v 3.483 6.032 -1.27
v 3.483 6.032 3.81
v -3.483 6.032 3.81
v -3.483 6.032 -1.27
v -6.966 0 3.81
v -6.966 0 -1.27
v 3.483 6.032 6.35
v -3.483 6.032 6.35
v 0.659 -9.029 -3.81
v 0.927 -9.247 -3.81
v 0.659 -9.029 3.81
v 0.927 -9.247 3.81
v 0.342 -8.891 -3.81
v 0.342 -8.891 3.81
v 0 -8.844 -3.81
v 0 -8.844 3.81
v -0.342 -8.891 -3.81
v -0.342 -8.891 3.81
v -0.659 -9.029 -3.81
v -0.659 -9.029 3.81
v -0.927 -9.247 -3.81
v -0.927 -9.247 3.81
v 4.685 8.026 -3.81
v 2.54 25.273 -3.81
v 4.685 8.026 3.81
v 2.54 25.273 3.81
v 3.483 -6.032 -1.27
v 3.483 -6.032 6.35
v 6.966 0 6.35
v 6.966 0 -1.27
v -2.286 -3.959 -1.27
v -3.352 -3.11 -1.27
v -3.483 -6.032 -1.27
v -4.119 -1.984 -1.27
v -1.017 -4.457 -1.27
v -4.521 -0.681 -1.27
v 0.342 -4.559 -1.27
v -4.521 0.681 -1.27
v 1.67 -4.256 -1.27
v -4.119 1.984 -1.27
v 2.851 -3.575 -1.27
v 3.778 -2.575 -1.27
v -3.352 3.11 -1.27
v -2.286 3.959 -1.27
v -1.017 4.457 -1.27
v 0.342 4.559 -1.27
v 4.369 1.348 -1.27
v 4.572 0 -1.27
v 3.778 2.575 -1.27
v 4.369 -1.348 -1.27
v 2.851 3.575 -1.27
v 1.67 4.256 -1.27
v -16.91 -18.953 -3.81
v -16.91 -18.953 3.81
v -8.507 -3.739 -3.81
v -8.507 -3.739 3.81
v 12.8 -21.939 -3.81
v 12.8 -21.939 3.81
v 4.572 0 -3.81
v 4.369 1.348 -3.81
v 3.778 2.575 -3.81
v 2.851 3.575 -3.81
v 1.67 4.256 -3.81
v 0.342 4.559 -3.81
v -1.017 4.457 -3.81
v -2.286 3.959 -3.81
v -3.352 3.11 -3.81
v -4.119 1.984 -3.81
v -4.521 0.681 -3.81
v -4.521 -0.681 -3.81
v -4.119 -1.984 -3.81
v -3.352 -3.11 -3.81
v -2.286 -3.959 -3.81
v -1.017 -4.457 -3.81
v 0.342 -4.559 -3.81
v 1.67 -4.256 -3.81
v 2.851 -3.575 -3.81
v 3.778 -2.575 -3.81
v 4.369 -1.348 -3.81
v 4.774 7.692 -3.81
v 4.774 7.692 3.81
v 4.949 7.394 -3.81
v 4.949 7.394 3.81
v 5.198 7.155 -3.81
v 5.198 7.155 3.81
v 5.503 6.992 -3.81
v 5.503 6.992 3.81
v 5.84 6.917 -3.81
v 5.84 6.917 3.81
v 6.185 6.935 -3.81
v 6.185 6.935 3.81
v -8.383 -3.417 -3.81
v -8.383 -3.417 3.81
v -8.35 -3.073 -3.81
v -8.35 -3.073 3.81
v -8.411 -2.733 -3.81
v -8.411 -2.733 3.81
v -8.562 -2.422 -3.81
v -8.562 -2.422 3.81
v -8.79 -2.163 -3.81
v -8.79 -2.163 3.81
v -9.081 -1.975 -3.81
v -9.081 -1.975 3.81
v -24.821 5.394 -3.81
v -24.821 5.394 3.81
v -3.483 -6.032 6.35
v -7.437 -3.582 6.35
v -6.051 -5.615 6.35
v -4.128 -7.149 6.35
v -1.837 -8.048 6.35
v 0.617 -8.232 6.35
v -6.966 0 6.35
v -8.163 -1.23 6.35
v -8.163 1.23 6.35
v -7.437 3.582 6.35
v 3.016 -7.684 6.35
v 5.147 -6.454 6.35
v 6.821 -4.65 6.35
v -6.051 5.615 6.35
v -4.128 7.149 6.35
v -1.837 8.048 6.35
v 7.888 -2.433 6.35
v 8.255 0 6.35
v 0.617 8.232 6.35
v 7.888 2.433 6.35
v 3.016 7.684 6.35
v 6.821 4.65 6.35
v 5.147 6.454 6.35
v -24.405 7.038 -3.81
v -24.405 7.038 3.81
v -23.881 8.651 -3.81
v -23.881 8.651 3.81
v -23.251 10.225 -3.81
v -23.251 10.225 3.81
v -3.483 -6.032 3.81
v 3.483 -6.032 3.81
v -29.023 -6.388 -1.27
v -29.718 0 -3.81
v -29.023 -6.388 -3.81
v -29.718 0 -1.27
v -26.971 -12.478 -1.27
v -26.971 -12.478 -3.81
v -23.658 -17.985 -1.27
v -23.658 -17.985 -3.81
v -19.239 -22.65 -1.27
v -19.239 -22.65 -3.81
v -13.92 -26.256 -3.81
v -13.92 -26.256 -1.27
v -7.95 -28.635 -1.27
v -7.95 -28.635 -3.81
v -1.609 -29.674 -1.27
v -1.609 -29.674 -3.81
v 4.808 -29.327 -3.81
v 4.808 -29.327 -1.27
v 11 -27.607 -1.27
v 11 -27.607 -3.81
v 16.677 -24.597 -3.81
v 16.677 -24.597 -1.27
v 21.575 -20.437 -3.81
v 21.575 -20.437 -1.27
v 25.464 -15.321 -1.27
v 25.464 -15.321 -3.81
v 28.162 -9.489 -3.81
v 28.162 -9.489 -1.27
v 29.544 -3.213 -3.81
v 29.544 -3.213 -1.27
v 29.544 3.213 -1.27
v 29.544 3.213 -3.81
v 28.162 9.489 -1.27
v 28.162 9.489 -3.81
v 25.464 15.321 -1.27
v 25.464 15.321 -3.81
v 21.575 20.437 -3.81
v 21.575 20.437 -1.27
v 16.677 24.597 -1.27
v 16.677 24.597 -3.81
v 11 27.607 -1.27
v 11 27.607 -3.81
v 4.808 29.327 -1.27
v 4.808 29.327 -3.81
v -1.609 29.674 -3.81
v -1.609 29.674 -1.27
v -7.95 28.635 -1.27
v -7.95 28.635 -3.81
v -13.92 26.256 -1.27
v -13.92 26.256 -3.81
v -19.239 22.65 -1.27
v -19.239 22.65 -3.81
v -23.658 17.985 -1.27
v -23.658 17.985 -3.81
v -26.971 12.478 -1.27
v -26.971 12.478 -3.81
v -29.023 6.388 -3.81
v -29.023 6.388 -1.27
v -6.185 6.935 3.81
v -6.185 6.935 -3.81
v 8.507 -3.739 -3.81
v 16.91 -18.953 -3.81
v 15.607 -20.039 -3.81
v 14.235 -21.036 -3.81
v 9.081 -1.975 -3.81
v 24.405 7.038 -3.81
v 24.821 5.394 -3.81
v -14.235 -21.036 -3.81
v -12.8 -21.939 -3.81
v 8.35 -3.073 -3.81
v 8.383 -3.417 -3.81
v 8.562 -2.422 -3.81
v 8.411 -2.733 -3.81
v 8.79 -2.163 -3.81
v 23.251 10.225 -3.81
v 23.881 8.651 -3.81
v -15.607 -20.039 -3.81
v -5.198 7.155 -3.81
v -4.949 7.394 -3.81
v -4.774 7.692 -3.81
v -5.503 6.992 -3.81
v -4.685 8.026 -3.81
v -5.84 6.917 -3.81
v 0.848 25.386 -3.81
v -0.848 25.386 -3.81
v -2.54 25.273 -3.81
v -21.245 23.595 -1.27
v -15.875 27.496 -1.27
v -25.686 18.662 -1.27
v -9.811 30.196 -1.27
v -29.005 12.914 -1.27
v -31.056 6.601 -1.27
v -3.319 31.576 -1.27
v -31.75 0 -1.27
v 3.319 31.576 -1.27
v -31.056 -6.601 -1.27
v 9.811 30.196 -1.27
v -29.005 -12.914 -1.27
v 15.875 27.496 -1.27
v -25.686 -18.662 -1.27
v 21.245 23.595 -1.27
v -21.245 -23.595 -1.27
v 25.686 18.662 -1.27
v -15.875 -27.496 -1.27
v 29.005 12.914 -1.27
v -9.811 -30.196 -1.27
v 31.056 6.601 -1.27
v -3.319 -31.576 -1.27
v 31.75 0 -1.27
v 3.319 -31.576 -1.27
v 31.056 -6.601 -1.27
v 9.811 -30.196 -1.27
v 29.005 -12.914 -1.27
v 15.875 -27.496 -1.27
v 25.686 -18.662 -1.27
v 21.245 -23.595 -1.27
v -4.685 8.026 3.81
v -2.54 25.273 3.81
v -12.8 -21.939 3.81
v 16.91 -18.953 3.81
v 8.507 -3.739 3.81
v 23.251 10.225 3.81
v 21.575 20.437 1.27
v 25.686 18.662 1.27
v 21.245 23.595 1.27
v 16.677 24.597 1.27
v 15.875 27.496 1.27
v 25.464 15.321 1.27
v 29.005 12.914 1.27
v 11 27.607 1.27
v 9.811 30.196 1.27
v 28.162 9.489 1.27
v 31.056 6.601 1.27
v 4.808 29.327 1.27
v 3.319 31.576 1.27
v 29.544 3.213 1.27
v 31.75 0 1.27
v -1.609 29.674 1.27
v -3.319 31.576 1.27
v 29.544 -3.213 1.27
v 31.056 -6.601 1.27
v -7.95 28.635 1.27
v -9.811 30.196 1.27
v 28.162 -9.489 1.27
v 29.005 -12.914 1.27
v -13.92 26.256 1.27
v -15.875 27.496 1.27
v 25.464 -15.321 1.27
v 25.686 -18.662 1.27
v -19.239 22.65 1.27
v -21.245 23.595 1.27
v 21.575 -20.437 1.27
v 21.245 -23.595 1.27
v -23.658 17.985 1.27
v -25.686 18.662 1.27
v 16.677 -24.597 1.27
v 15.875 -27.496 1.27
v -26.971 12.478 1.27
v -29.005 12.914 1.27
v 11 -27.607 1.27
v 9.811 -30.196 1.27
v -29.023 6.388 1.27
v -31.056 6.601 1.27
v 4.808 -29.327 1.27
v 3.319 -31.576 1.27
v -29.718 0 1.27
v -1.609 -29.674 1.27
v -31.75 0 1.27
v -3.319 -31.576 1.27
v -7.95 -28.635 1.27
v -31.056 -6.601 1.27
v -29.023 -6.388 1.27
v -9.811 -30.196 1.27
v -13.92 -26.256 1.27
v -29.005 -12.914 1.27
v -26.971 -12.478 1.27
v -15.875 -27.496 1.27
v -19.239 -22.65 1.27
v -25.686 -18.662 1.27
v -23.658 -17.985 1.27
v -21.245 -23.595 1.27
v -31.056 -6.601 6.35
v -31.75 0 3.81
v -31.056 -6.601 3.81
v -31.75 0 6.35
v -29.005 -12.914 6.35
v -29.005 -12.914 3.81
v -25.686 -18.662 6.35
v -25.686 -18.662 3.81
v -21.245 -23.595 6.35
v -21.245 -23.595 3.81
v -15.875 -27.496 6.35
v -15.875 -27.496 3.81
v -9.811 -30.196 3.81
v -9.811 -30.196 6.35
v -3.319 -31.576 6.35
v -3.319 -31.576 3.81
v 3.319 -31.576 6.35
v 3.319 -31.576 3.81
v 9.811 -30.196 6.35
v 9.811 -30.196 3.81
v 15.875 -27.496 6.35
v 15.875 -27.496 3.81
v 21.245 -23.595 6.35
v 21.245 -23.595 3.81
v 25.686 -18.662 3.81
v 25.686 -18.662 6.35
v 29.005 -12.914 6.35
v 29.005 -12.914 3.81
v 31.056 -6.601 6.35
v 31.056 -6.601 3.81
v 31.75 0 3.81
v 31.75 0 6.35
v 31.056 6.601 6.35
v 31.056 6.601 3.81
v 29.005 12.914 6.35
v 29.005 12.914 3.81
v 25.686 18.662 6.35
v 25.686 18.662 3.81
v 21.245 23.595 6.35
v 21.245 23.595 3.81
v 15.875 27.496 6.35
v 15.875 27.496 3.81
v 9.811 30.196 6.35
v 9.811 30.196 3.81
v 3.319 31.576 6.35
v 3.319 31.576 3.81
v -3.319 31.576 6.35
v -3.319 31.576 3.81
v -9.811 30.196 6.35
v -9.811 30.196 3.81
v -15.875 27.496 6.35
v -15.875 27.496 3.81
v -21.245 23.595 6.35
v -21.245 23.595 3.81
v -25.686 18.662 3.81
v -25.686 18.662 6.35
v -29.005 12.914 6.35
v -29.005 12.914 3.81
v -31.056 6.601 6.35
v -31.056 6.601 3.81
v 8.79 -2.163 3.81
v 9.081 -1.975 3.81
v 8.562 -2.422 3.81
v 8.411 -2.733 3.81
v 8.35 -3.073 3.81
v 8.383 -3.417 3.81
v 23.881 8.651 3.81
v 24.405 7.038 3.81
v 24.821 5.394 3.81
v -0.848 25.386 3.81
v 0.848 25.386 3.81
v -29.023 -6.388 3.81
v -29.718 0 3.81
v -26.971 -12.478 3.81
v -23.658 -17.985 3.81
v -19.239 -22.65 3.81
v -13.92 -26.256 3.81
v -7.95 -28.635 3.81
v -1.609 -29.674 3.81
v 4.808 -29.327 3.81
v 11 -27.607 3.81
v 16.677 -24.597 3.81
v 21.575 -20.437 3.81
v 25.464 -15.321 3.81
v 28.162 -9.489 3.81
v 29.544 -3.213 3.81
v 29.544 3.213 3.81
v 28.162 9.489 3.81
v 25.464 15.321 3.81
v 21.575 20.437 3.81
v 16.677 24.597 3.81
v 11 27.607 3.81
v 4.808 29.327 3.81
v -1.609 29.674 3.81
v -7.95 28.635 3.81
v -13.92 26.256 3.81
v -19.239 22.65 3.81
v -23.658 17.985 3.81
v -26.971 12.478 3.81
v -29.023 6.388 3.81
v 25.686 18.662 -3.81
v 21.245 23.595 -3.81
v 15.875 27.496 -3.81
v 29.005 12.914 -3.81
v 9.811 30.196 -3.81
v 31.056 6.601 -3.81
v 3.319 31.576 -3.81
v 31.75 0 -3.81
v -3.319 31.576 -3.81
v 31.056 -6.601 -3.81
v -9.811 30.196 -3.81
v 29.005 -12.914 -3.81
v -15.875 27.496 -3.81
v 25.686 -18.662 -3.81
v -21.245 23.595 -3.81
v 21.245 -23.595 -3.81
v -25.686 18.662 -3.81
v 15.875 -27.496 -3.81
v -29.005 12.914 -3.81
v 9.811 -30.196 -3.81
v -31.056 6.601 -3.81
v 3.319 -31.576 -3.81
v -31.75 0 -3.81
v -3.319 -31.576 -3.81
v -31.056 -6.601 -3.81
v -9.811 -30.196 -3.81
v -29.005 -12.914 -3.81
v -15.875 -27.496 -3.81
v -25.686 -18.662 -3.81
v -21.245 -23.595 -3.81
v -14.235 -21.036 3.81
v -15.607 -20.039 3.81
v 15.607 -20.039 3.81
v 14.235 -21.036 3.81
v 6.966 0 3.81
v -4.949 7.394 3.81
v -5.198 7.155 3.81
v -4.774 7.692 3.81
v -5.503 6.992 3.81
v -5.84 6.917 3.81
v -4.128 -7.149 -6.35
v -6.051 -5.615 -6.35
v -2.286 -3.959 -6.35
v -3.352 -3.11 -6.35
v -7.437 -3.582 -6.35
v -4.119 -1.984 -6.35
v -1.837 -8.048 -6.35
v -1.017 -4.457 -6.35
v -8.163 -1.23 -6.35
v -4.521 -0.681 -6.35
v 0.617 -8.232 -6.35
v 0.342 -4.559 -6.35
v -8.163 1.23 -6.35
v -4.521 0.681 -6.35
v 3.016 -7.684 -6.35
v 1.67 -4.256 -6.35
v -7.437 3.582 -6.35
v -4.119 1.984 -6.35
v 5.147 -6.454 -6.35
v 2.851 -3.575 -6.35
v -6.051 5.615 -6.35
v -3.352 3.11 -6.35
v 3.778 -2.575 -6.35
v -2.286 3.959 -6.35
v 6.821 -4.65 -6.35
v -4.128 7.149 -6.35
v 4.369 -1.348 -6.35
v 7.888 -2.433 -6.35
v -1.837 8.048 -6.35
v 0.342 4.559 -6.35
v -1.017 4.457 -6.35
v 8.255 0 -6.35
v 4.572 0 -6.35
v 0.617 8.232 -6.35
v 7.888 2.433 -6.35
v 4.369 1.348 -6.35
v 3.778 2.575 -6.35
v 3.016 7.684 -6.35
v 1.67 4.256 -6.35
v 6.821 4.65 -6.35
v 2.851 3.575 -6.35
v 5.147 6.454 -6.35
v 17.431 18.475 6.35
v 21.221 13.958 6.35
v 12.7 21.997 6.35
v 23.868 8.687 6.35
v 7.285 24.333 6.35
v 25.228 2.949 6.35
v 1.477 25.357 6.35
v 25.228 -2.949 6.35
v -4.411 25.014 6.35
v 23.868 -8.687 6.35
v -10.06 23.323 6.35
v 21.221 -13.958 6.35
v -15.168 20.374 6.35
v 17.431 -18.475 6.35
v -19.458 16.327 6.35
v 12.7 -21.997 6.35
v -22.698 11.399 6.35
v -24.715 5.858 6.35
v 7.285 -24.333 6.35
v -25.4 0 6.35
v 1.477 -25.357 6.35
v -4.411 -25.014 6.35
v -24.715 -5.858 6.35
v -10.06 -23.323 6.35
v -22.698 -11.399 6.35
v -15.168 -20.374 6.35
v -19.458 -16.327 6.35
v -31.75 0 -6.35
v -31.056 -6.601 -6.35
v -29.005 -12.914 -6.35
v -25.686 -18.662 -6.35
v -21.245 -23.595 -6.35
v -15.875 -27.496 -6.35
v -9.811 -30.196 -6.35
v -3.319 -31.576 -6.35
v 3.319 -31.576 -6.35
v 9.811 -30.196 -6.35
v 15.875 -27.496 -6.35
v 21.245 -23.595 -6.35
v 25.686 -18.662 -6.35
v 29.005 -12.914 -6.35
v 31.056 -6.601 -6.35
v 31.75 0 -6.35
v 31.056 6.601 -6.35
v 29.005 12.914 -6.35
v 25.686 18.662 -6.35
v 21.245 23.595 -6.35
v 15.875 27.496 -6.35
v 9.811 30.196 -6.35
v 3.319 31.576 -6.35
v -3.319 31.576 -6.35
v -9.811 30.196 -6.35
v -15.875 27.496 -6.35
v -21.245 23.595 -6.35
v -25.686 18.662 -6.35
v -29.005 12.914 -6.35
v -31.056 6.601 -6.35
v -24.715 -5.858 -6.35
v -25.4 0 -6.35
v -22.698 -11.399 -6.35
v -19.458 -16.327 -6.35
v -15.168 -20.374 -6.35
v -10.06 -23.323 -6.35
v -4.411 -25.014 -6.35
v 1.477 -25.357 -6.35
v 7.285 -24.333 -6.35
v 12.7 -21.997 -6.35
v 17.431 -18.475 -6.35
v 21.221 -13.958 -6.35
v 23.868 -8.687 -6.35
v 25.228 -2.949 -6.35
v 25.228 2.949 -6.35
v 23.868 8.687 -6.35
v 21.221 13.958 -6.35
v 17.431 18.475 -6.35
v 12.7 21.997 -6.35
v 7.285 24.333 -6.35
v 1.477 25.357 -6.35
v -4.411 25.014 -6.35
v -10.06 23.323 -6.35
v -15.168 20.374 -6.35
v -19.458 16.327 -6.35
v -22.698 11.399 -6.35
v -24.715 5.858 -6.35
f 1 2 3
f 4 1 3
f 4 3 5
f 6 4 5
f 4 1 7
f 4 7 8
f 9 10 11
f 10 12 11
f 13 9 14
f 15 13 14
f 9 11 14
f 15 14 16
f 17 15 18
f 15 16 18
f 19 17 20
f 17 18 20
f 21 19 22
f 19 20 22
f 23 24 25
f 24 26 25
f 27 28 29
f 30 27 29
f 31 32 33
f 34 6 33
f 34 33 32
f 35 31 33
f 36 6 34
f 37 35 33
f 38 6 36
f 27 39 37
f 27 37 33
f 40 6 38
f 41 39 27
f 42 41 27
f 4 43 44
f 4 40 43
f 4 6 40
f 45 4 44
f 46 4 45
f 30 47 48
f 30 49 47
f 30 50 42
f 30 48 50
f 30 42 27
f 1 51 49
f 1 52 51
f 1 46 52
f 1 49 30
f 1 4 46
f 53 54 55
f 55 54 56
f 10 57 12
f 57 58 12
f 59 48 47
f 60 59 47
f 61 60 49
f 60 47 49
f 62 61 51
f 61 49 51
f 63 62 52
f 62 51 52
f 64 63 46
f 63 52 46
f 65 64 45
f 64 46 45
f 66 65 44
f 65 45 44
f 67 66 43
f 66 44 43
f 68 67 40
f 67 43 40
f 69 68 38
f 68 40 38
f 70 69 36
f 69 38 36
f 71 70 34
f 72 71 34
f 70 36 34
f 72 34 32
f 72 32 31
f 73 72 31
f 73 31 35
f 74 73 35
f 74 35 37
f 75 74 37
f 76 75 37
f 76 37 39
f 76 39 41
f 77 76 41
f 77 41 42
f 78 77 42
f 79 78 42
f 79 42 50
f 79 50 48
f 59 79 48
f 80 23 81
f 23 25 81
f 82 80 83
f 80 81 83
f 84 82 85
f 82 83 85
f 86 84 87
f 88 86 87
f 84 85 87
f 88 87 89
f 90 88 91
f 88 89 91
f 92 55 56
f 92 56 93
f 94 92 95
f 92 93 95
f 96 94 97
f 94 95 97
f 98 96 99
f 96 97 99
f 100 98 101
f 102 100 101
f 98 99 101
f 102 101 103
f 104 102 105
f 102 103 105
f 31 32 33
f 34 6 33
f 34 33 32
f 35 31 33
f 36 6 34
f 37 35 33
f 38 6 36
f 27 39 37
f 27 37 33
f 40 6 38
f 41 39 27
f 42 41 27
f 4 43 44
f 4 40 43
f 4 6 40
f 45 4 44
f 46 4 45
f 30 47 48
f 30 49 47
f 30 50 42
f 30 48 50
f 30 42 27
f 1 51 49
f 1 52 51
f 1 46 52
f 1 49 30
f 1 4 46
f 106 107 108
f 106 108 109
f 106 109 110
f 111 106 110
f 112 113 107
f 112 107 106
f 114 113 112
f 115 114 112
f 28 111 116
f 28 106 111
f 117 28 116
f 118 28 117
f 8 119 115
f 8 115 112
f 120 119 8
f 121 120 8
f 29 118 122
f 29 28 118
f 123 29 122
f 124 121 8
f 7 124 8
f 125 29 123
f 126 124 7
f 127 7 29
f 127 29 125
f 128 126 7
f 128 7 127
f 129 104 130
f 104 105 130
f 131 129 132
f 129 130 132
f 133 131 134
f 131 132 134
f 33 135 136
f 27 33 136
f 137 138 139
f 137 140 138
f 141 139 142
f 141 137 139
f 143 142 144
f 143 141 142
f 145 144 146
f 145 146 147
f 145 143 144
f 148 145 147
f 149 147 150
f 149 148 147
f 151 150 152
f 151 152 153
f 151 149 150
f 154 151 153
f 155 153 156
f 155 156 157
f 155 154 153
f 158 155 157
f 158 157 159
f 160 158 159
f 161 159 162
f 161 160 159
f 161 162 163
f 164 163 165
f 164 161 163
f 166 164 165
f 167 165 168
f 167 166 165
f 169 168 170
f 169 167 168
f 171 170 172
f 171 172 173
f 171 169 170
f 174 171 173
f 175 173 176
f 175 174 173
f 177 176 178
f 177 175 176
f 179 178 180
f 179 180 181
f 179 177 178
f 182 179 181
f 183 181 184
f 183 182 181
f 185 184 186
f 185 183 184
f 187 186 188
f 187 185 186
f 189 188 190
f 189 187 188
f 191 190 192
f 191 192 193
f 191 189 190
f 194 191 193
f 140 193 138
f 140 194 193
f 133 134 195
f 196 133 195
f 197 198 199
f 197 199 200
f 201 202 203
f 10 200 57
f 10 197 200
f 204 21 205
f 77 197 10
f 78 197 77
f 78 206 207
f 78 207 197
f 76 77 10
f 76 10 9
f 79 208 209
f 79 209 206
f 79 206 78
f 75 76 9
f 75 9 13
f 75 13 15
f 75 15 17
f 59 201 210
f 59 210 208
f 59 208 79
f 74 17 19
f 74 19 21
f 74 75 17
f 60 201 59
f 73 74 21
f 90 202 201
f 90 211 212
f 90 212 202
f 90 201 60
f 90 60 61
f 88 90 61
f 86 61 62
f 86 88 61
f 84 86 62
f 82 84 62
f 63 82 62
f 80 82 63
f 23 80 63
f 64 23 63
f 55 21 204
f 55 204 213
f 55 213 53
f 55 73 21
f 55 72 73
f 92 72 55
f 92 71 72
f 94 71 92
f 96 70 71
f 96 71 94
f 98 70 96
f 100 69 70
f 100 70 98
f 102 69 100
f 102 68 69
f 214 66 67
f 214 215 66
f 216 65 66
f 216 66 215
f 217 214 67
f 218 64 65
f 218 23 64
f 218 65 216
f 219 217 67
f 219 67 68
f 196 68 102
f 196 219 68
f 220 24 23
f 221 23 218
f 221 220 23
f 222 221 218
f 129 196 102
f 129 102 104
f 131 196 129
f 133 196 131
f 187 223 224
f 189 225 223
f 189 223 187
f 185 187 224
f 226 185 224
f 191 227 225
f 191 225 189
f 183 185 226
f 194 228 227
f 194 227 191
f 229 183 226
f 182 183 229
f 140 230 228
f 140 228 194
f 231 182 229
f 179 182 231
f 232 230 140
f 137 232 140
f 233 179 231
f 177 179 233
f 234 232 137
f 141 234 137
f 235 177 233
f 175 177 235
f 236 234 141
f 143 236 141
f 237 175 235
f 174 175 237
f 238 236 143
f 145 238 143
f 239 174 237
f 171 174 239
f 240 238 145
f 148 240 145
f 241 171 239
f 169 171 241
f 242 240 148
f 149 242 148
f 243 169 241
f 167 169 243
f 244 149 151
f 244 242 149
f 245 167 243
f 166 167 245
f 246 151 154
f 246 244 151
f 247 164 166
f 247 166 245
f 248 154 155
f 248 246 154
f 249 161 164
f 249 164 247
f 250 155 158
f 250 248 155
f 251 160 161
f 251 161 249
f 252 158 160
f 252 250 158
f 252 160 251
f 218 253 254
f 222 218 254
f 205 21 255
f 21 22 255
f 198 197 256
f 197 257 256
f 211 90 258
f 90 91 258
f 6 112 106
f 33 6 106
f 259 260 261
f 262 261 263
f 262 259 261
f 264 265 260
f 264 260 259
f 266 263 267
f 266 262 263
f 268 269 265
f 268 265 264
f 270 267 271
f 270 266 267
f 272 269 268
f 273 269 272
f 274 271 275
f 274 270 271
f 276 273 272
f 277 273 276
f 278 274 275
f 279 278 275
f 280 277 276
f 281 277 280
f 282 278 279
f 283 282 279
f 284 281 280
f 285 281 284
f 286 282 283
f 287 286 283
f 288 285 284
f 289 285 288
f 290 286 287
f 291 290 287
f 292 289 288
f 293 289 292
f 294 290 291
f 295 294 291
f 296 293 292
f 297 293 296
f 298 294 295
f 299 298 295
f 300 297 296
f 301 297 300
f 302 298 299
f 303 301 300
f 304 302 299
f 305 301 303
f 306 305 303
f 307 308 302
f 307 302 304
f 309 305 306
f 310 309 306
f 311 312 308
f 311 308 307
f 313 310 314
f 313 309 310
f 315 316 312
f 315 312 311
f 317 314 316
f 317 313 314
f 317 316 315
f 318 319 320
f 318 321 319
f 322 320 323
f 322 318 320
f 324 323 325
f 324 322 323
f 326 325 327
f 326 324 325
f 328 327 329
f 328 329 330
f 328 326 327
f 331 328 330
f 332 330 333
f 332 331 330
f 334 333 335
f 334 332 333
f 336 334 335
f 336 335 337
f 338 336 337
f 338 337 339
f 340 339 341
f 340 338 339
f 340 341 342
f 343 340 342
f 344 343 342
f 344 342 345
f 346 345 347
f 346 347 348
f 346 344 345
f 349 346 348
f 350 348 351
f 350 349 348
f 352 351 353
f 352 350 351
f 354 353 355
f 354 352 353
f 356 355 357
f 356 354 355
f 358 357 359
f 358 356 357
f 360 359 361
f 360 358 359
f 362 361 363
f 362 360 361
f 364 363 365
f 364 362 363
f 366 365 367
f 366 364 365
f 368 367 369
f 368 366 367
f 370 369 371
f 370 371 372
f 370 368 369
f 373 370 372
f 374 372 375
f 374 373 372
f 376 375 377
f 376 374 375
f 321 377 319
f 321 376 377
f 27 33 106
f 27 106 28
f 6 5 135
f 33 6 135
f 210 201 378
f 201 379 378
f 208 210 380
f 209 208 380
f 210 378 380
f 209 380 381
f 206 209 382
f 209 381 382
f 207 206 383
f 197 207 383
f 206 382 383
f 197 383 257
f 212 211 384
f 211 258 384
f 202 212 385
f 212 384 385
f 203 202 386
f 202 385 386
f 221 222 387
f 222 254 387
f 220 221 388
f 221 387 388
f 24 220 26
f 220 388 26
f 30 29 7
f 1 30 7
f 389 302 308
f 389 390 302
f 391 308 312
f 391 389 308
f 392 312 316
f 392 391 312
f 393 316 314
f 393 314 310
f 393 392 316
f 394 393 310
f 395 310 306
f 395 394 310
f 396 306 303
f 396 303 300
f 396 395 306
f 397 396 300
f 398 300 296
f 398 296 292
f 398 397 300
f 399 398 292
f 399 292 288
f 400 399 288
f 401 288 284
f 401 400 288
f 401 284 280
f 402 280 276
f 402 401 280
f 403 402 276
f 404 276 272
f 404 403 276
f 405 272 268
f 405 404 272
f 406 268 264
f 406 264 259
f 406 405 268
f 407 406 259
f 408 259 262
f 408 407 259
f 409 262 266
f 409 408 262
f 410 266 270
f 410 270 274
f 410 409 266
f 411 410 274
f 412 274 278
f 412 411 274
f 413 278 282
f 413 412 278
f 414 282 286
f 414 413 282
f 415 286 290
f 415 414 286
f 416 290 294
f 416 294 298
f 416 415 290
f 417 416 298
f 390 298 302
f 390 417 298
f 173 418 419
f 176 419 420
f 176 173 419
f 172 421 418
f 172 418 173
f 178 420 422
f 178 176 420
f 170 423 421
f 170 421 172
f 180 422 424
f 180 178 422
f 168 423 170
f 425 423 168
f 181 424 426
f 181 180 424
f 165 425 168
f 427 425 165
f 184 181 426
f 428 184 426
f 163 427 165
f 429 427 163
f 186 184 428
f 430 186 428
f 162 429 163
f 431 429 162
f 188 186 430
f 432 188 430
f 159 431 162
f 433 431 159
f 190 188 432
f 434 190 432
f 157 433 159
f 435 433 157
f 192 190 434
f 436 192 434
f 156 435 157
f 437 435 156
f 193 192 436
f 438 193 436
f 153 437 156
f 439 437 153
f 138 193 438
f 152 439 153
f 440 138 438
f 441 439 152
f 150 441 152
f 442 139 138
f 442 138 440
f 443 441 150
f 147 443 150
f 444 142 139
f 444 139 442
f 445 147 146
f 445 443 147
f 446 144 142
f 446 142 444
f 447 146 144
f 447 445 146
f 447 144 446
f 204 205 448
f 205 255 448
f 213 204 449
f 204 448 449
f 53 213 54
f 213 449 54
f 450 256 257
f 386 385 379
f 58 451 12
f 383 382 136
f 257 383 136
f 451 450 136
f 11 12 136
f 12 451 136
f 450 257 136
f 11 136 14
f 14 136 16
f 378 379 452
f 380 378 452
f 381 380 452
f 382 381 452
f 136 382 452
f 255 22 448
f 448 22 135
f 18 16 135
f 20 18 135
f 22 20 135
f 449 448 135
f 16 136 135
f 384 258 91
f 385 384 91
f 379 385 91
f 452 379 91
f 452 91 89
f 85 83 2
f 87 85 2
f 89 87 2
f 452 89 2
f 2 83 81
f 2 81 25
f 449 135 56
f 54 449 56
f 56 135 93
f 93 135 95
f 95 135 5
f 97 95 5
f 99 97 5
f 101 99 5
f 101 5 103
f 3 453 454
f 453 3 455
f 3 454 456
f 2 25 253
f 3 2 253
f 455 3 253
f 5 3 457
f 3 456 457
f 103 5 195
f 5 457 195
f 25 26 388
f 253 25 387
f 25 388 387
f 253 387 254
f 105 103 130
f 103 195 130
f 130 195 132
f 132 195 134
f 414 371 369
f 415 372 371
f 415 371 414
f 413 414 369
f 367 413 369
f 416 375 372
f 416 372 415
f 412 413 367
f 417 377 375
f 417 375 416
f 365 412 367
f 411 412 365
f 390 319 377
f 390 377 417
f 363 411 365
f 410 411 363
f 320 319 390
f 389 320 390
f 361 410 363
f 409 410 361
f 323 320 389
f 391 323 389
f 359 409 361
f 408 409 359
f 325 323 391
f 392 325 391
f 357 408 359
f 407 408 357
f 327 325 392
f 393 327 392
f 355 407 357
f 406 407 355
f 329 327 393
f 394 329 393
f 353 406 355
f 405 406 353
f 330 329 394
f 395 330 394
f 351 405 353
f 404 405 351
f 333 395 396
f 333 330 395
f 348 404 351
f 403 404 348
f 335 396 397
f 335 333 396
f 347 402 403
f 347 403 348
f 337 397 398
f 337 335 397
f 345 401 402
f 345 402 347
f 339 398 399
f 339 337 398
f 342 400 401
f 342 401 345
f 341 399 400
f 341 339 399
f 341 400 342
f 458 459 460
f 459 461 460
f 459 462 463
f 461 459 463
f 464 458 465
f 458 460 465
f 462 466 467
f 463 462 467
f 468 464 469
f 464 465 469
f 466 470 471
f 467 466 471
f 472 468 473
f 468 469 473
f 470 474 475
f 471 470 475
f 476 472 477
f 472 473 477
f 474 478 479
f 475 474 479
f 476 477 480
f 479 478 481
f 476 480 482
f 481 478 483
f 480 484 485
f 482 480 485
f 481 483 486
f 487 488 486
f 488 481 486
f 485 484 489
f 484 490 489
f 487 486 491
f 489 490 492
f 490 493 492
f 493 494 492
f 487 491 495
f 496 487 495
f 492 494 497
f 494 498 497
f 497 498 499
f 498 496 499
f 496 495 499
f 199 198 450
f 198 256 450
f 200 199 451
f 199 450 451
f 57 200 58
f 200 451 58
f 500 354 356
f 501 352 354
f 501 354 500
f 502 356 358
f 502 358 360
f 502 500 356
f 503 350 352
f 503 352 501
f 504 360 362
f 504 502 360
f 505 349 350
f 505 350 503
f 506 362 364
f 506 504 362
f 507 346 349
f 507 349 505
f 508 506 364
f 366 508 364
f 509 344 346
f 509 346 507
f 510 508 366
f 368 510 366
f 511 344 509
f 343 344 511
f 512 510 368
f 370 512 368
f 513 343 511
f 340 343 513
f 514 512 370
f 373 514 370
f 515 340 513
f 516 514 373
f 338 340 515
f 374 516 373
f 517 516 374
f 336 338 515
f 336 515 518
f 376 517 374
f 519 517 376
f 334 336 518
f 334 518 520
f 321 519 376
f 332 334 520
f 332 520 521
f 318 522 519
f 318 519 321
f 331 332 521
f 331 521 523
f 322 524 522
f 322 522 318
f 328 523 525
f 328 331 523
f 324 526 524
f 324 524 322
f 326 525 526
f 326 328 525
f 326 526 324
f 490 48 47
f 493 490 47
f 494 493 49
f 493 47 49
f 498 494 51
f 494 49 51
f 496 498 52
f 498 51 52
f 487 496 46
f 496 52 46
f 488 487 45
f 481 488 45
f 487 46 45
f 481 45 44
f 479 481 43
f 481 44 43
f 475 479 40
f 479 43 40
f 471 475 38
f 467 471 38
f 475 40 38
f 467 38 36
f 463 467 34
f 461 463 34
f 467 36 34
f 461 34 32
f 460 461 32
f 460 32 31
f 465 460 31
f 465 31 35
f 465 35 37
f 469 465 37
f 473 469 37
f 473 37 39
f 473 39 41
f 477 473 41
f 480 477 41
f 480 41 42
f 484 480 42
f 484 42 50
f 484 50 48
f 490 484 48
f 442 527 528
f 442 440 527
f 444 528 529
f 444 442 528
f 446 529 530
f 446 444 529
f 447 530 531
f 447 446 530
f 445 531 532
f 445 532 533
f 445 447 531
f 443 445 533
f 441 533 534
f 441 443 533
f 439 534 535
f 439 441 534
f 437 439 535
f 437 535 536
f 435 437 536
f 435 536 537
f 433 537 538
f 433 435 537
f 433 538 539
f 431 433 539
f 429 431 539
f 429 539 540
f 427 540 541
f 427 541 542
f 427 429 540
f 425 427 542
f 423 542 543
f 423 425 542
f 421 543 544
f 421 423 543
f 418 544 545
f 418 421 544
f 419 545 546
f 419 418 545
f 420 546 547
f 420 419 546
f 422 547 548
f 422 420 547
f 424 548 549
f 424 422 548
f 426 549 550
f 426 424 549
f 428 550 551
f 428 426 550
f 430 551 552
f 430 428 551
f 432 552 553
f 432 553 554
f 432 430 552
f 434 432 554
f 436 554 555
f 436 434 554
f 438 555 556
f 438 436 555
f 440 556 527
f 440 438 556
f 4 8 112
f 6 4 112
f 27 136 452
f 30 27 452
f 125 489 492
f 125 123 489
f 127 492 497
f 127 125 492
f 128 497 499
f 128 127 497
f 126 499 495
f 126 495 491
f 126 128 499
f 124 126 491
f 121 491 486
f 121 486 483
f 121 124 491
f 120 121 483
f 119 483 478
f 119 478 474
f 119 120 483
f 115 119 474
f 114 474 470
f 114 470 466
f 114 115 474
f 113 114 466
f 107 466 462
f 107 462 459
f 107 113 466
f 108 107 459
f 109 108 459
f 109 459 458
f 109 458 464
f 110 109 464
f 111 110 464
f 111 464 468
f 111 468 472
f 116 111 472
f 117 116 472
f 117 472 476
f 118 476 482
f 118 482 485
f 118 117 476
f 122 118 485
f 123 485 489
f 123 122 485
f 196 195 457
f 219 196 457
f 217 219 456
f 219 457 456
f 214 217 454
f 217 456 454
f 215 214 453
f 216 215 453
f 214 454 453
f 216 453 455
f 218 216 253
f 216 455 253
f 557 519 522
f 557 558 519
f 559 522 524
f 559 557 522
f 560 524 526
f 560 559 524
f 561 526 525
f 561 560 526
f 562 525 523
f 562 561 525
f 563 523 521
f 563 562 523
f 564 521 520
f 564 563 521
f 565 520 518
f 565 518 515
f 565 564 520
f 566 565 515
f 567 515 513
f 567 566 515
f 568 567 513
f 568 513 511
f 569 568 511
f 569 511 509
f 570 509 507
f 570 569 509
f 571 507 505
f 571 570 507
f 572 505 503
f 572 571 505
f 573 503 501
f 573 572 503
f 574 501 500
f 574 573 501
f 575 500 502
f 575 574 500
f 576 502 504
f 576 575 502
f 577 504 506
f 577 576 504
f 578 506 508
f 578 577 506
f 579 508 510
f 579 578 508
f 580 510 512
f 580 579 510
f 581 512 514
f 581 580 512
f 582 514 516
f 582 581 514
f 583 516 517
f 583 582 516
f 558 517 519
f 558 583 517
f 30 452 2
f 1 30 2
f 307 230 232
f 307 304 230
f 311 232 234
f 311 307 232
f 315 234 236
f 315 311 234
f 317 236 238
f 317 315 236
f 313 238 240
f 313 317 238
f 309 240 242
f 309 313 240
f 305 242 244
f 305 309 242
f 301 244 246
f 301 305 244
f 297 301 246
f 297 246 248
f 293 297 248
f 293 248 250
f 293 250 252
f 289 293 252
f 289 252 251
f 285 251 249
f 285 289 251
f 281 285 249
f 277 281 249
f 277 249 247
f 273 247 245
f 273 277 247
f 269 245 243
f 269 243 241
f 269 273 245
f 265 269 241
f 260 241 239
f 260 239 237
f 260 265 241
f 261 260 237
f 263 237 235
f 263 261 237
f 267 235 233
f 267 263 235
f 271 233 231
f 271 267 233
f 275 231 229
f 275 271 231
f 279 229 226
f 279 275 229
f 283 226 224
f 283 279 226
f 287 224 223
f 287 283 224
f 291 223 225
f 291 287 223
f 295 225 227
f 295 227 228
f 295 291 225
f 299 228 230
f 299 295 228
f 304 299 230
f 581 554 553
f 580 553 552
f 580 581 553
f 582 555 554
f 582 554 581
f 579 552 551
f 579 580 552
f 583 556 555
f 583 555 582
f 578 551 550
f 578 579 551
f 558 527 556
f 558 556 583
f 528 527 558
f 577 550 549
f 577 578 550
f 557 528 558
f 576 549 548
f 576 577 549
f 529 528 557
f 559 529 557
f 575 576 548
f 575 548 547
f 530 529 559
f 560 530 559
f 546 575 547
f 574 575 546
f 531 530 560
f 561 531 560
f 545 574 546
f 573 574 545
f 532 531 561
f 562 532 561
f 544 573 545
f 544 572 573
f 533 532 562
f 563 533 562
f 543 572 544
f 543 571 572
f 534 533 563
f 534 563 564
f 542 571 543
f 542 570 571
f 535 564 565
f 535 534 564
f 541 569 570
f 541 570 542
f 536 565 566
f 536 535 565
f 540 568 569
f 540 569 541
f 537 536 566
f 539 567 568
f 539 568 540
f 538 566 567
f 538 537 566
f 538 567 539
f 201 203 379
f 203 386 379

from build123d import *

# Parameters (mm, degrees)
SKETCH2_R           = 8.255
BOSS_EXTRUDE1_DEPTH = 6.35
BOSS_EXTRUDE3_DEPTH = 3.81
CUT_EXTRUDE1_DEPTH  = 7.62
SKETCH5_R           = 4.572
CUT_EXTRUDE2_DEPTH  = 6.08


with BuildPart() as part:
    # Sketch1 → Revolve1 (revolve)
    with BuildSketch(Plane(origin=(0, 0, 0), x_dir=(1, 0, 0), z_dir=(0, 1, 0))):
        Polygon((-25.4, 6.35), (-31.75, 6.35), (-31.75, 3.81), (-29.718, 3.81), (-29.718, 1.27), (-31.75, 1.27), (-31.75, -1.27), (-29.718, -1.27), (-29.718, -3.81), (-31.75, -3.81), (-31.75, -6.35), (-25.4, -6.35), align=None)
    revolve(axis=Axis((0, 0, -7.15010339), (0, 0, 1)))


with BuildPart() as body_2:
    # Sketch2 → Boss-Extrude1 (new body, symmetric)
    with BuildSketch(Plane.XY):
        Circle(SKETCH2_R)
    extrude(amount=BOSS_EXTRUDE1_DEPTH, both=True)


with BuildPart() as body_3:
    # Sketch3 → Boss-Extrude3 (new body, symmetric)
    with BuildSketch(Plane.XY):
        with BuildLine():
            Line((-4.684628445, 8.025767673), (-2.54, 25.272680903))
            ThreePointArc((-2.54, 25.272680903), (0, 25.4), (2.54, 25.272680903))
            Line((2.54, 25.272680903), (4.684628445, 8.025767673))
            ThreePointArc((4.684628445, 8.025767673), (5.198434869, 7.155031769), (6.185328842, 6.935445013))
            Line((6.185328842, 6.935445013), (23.250844691, 10.225371444))
            ThreePointArc((23.250844691, 10.225371444), (24.156835514, 7.849031657), (24.820651022, 5.394004341))
            Line((24.820651022, 5.394004341), (9.080588446, -1.975247805))
            ThreePointArc((9.080588446, -1.975247805), (8.411244307, -2.732978945), (8.507371901, -3.739426928))
            Line((8.507371901, -3.739426928), (16.909812286, -18.953053803))
            ThreePointArc((16.909812286, -18.953053803), (14.929745408, -20.549031657), (12.800005955, -21.939002884))
            Line((12.800005955, -21.939002884), (0.927483852, -9.246537953))
            ThreePointArc((0.927483852, -9.246537953), (0, -8.844105648), (-0.927483852, -9.246537953))
            Line((-0.927483852, -9.246537953), (-12.800005955, -21.939002884))
            ThreePointArc((-12.800005955, -21.939002884), (-14.929745408, -20.549031657), (-16.909812286, -18.953053803))
            Line((-16.909812286, -18.953053803), (-8.507371901, -3.739426928))
            ThreePointArc((-8.507371901, -3.739426928), (-8.411244307, -2.732978945), (-9.080588446, -1.975247805))
            Line((-9.080588446, -1.975247805), (-24.820651022, 5.394004341))
            ThreePointArc((-24.820651022, 5.394004341), (-24.156835514, 7.849031657), (-23.250844691, 10.225371444))
            Line((-23.250844691, 10.225371444), (-6.185328842, 6.935445013))
            ThreePointArc((-6.185328842, 6.935445013), (-5.198434869, 7.155031769), (-4.684628445, 8.025767673))
        make_face()
    extrude(amount=BOSS_EXTRUDE3_DEPTH, both=True)


with BuildPart() as cut_extrude1_tool:
    # Sketch4 → Cut-Extrude1 (new body)
    with BuildSketch(Plane.XY.offset(6.35)):
        Polygon((3.482865499, 6.0325), (-3.482865499, 6.0325), (-6.965730998, 0), (-3.482865499, -6.0325), (3.482865499, -6.0325), (6.965730998, 0), align=None)
    extrude(amount=-CUT_EXTRUDE1_DEPTH)


with BuildPart() as body_2_1:
    add(body_2.part)

    # Cut-Extrude1: cut by cut_extrude1_tool
    add(cut_extrude1_tool.part, mode=Mode.SUBTRACT)


with BuildPart() as body_3_1:
    add(body_3.part)

    # Cut-Extrude1: cut by cut_extrude1_tool
    add(cut_extrude1_tool.part, mode=Mode.SUBTRACT)


with BuildPart() as cut_extrude2_tool:
    # Sketch5 → Cut-Extrude2 (new body, through all)
    with BuildSketch(Plane.XY.offset(-1.27)):
        Circle(SKETCH5_R)
    extrude(amount=-CUT_EXTRUDE2_DEPTH)


with BuildPart() as body_2_2:
    add(body_2_1.part)

    # Cut-Extrude2: cut by cut_extrude2_tool
    add(cut_extrude2_tool.part, mode=Mode.SUBTRACT)


with BuildPart() as body_3_2:
    add(body_3_1.part)

    # Cut-Extrude2: cut by cut_extrude2_tool
    add(cut_extrude2_tool.part, mode=Mode.SUBTRACT)


solid = Compound([part.part, body_2_2.part, body_3_2.part])
